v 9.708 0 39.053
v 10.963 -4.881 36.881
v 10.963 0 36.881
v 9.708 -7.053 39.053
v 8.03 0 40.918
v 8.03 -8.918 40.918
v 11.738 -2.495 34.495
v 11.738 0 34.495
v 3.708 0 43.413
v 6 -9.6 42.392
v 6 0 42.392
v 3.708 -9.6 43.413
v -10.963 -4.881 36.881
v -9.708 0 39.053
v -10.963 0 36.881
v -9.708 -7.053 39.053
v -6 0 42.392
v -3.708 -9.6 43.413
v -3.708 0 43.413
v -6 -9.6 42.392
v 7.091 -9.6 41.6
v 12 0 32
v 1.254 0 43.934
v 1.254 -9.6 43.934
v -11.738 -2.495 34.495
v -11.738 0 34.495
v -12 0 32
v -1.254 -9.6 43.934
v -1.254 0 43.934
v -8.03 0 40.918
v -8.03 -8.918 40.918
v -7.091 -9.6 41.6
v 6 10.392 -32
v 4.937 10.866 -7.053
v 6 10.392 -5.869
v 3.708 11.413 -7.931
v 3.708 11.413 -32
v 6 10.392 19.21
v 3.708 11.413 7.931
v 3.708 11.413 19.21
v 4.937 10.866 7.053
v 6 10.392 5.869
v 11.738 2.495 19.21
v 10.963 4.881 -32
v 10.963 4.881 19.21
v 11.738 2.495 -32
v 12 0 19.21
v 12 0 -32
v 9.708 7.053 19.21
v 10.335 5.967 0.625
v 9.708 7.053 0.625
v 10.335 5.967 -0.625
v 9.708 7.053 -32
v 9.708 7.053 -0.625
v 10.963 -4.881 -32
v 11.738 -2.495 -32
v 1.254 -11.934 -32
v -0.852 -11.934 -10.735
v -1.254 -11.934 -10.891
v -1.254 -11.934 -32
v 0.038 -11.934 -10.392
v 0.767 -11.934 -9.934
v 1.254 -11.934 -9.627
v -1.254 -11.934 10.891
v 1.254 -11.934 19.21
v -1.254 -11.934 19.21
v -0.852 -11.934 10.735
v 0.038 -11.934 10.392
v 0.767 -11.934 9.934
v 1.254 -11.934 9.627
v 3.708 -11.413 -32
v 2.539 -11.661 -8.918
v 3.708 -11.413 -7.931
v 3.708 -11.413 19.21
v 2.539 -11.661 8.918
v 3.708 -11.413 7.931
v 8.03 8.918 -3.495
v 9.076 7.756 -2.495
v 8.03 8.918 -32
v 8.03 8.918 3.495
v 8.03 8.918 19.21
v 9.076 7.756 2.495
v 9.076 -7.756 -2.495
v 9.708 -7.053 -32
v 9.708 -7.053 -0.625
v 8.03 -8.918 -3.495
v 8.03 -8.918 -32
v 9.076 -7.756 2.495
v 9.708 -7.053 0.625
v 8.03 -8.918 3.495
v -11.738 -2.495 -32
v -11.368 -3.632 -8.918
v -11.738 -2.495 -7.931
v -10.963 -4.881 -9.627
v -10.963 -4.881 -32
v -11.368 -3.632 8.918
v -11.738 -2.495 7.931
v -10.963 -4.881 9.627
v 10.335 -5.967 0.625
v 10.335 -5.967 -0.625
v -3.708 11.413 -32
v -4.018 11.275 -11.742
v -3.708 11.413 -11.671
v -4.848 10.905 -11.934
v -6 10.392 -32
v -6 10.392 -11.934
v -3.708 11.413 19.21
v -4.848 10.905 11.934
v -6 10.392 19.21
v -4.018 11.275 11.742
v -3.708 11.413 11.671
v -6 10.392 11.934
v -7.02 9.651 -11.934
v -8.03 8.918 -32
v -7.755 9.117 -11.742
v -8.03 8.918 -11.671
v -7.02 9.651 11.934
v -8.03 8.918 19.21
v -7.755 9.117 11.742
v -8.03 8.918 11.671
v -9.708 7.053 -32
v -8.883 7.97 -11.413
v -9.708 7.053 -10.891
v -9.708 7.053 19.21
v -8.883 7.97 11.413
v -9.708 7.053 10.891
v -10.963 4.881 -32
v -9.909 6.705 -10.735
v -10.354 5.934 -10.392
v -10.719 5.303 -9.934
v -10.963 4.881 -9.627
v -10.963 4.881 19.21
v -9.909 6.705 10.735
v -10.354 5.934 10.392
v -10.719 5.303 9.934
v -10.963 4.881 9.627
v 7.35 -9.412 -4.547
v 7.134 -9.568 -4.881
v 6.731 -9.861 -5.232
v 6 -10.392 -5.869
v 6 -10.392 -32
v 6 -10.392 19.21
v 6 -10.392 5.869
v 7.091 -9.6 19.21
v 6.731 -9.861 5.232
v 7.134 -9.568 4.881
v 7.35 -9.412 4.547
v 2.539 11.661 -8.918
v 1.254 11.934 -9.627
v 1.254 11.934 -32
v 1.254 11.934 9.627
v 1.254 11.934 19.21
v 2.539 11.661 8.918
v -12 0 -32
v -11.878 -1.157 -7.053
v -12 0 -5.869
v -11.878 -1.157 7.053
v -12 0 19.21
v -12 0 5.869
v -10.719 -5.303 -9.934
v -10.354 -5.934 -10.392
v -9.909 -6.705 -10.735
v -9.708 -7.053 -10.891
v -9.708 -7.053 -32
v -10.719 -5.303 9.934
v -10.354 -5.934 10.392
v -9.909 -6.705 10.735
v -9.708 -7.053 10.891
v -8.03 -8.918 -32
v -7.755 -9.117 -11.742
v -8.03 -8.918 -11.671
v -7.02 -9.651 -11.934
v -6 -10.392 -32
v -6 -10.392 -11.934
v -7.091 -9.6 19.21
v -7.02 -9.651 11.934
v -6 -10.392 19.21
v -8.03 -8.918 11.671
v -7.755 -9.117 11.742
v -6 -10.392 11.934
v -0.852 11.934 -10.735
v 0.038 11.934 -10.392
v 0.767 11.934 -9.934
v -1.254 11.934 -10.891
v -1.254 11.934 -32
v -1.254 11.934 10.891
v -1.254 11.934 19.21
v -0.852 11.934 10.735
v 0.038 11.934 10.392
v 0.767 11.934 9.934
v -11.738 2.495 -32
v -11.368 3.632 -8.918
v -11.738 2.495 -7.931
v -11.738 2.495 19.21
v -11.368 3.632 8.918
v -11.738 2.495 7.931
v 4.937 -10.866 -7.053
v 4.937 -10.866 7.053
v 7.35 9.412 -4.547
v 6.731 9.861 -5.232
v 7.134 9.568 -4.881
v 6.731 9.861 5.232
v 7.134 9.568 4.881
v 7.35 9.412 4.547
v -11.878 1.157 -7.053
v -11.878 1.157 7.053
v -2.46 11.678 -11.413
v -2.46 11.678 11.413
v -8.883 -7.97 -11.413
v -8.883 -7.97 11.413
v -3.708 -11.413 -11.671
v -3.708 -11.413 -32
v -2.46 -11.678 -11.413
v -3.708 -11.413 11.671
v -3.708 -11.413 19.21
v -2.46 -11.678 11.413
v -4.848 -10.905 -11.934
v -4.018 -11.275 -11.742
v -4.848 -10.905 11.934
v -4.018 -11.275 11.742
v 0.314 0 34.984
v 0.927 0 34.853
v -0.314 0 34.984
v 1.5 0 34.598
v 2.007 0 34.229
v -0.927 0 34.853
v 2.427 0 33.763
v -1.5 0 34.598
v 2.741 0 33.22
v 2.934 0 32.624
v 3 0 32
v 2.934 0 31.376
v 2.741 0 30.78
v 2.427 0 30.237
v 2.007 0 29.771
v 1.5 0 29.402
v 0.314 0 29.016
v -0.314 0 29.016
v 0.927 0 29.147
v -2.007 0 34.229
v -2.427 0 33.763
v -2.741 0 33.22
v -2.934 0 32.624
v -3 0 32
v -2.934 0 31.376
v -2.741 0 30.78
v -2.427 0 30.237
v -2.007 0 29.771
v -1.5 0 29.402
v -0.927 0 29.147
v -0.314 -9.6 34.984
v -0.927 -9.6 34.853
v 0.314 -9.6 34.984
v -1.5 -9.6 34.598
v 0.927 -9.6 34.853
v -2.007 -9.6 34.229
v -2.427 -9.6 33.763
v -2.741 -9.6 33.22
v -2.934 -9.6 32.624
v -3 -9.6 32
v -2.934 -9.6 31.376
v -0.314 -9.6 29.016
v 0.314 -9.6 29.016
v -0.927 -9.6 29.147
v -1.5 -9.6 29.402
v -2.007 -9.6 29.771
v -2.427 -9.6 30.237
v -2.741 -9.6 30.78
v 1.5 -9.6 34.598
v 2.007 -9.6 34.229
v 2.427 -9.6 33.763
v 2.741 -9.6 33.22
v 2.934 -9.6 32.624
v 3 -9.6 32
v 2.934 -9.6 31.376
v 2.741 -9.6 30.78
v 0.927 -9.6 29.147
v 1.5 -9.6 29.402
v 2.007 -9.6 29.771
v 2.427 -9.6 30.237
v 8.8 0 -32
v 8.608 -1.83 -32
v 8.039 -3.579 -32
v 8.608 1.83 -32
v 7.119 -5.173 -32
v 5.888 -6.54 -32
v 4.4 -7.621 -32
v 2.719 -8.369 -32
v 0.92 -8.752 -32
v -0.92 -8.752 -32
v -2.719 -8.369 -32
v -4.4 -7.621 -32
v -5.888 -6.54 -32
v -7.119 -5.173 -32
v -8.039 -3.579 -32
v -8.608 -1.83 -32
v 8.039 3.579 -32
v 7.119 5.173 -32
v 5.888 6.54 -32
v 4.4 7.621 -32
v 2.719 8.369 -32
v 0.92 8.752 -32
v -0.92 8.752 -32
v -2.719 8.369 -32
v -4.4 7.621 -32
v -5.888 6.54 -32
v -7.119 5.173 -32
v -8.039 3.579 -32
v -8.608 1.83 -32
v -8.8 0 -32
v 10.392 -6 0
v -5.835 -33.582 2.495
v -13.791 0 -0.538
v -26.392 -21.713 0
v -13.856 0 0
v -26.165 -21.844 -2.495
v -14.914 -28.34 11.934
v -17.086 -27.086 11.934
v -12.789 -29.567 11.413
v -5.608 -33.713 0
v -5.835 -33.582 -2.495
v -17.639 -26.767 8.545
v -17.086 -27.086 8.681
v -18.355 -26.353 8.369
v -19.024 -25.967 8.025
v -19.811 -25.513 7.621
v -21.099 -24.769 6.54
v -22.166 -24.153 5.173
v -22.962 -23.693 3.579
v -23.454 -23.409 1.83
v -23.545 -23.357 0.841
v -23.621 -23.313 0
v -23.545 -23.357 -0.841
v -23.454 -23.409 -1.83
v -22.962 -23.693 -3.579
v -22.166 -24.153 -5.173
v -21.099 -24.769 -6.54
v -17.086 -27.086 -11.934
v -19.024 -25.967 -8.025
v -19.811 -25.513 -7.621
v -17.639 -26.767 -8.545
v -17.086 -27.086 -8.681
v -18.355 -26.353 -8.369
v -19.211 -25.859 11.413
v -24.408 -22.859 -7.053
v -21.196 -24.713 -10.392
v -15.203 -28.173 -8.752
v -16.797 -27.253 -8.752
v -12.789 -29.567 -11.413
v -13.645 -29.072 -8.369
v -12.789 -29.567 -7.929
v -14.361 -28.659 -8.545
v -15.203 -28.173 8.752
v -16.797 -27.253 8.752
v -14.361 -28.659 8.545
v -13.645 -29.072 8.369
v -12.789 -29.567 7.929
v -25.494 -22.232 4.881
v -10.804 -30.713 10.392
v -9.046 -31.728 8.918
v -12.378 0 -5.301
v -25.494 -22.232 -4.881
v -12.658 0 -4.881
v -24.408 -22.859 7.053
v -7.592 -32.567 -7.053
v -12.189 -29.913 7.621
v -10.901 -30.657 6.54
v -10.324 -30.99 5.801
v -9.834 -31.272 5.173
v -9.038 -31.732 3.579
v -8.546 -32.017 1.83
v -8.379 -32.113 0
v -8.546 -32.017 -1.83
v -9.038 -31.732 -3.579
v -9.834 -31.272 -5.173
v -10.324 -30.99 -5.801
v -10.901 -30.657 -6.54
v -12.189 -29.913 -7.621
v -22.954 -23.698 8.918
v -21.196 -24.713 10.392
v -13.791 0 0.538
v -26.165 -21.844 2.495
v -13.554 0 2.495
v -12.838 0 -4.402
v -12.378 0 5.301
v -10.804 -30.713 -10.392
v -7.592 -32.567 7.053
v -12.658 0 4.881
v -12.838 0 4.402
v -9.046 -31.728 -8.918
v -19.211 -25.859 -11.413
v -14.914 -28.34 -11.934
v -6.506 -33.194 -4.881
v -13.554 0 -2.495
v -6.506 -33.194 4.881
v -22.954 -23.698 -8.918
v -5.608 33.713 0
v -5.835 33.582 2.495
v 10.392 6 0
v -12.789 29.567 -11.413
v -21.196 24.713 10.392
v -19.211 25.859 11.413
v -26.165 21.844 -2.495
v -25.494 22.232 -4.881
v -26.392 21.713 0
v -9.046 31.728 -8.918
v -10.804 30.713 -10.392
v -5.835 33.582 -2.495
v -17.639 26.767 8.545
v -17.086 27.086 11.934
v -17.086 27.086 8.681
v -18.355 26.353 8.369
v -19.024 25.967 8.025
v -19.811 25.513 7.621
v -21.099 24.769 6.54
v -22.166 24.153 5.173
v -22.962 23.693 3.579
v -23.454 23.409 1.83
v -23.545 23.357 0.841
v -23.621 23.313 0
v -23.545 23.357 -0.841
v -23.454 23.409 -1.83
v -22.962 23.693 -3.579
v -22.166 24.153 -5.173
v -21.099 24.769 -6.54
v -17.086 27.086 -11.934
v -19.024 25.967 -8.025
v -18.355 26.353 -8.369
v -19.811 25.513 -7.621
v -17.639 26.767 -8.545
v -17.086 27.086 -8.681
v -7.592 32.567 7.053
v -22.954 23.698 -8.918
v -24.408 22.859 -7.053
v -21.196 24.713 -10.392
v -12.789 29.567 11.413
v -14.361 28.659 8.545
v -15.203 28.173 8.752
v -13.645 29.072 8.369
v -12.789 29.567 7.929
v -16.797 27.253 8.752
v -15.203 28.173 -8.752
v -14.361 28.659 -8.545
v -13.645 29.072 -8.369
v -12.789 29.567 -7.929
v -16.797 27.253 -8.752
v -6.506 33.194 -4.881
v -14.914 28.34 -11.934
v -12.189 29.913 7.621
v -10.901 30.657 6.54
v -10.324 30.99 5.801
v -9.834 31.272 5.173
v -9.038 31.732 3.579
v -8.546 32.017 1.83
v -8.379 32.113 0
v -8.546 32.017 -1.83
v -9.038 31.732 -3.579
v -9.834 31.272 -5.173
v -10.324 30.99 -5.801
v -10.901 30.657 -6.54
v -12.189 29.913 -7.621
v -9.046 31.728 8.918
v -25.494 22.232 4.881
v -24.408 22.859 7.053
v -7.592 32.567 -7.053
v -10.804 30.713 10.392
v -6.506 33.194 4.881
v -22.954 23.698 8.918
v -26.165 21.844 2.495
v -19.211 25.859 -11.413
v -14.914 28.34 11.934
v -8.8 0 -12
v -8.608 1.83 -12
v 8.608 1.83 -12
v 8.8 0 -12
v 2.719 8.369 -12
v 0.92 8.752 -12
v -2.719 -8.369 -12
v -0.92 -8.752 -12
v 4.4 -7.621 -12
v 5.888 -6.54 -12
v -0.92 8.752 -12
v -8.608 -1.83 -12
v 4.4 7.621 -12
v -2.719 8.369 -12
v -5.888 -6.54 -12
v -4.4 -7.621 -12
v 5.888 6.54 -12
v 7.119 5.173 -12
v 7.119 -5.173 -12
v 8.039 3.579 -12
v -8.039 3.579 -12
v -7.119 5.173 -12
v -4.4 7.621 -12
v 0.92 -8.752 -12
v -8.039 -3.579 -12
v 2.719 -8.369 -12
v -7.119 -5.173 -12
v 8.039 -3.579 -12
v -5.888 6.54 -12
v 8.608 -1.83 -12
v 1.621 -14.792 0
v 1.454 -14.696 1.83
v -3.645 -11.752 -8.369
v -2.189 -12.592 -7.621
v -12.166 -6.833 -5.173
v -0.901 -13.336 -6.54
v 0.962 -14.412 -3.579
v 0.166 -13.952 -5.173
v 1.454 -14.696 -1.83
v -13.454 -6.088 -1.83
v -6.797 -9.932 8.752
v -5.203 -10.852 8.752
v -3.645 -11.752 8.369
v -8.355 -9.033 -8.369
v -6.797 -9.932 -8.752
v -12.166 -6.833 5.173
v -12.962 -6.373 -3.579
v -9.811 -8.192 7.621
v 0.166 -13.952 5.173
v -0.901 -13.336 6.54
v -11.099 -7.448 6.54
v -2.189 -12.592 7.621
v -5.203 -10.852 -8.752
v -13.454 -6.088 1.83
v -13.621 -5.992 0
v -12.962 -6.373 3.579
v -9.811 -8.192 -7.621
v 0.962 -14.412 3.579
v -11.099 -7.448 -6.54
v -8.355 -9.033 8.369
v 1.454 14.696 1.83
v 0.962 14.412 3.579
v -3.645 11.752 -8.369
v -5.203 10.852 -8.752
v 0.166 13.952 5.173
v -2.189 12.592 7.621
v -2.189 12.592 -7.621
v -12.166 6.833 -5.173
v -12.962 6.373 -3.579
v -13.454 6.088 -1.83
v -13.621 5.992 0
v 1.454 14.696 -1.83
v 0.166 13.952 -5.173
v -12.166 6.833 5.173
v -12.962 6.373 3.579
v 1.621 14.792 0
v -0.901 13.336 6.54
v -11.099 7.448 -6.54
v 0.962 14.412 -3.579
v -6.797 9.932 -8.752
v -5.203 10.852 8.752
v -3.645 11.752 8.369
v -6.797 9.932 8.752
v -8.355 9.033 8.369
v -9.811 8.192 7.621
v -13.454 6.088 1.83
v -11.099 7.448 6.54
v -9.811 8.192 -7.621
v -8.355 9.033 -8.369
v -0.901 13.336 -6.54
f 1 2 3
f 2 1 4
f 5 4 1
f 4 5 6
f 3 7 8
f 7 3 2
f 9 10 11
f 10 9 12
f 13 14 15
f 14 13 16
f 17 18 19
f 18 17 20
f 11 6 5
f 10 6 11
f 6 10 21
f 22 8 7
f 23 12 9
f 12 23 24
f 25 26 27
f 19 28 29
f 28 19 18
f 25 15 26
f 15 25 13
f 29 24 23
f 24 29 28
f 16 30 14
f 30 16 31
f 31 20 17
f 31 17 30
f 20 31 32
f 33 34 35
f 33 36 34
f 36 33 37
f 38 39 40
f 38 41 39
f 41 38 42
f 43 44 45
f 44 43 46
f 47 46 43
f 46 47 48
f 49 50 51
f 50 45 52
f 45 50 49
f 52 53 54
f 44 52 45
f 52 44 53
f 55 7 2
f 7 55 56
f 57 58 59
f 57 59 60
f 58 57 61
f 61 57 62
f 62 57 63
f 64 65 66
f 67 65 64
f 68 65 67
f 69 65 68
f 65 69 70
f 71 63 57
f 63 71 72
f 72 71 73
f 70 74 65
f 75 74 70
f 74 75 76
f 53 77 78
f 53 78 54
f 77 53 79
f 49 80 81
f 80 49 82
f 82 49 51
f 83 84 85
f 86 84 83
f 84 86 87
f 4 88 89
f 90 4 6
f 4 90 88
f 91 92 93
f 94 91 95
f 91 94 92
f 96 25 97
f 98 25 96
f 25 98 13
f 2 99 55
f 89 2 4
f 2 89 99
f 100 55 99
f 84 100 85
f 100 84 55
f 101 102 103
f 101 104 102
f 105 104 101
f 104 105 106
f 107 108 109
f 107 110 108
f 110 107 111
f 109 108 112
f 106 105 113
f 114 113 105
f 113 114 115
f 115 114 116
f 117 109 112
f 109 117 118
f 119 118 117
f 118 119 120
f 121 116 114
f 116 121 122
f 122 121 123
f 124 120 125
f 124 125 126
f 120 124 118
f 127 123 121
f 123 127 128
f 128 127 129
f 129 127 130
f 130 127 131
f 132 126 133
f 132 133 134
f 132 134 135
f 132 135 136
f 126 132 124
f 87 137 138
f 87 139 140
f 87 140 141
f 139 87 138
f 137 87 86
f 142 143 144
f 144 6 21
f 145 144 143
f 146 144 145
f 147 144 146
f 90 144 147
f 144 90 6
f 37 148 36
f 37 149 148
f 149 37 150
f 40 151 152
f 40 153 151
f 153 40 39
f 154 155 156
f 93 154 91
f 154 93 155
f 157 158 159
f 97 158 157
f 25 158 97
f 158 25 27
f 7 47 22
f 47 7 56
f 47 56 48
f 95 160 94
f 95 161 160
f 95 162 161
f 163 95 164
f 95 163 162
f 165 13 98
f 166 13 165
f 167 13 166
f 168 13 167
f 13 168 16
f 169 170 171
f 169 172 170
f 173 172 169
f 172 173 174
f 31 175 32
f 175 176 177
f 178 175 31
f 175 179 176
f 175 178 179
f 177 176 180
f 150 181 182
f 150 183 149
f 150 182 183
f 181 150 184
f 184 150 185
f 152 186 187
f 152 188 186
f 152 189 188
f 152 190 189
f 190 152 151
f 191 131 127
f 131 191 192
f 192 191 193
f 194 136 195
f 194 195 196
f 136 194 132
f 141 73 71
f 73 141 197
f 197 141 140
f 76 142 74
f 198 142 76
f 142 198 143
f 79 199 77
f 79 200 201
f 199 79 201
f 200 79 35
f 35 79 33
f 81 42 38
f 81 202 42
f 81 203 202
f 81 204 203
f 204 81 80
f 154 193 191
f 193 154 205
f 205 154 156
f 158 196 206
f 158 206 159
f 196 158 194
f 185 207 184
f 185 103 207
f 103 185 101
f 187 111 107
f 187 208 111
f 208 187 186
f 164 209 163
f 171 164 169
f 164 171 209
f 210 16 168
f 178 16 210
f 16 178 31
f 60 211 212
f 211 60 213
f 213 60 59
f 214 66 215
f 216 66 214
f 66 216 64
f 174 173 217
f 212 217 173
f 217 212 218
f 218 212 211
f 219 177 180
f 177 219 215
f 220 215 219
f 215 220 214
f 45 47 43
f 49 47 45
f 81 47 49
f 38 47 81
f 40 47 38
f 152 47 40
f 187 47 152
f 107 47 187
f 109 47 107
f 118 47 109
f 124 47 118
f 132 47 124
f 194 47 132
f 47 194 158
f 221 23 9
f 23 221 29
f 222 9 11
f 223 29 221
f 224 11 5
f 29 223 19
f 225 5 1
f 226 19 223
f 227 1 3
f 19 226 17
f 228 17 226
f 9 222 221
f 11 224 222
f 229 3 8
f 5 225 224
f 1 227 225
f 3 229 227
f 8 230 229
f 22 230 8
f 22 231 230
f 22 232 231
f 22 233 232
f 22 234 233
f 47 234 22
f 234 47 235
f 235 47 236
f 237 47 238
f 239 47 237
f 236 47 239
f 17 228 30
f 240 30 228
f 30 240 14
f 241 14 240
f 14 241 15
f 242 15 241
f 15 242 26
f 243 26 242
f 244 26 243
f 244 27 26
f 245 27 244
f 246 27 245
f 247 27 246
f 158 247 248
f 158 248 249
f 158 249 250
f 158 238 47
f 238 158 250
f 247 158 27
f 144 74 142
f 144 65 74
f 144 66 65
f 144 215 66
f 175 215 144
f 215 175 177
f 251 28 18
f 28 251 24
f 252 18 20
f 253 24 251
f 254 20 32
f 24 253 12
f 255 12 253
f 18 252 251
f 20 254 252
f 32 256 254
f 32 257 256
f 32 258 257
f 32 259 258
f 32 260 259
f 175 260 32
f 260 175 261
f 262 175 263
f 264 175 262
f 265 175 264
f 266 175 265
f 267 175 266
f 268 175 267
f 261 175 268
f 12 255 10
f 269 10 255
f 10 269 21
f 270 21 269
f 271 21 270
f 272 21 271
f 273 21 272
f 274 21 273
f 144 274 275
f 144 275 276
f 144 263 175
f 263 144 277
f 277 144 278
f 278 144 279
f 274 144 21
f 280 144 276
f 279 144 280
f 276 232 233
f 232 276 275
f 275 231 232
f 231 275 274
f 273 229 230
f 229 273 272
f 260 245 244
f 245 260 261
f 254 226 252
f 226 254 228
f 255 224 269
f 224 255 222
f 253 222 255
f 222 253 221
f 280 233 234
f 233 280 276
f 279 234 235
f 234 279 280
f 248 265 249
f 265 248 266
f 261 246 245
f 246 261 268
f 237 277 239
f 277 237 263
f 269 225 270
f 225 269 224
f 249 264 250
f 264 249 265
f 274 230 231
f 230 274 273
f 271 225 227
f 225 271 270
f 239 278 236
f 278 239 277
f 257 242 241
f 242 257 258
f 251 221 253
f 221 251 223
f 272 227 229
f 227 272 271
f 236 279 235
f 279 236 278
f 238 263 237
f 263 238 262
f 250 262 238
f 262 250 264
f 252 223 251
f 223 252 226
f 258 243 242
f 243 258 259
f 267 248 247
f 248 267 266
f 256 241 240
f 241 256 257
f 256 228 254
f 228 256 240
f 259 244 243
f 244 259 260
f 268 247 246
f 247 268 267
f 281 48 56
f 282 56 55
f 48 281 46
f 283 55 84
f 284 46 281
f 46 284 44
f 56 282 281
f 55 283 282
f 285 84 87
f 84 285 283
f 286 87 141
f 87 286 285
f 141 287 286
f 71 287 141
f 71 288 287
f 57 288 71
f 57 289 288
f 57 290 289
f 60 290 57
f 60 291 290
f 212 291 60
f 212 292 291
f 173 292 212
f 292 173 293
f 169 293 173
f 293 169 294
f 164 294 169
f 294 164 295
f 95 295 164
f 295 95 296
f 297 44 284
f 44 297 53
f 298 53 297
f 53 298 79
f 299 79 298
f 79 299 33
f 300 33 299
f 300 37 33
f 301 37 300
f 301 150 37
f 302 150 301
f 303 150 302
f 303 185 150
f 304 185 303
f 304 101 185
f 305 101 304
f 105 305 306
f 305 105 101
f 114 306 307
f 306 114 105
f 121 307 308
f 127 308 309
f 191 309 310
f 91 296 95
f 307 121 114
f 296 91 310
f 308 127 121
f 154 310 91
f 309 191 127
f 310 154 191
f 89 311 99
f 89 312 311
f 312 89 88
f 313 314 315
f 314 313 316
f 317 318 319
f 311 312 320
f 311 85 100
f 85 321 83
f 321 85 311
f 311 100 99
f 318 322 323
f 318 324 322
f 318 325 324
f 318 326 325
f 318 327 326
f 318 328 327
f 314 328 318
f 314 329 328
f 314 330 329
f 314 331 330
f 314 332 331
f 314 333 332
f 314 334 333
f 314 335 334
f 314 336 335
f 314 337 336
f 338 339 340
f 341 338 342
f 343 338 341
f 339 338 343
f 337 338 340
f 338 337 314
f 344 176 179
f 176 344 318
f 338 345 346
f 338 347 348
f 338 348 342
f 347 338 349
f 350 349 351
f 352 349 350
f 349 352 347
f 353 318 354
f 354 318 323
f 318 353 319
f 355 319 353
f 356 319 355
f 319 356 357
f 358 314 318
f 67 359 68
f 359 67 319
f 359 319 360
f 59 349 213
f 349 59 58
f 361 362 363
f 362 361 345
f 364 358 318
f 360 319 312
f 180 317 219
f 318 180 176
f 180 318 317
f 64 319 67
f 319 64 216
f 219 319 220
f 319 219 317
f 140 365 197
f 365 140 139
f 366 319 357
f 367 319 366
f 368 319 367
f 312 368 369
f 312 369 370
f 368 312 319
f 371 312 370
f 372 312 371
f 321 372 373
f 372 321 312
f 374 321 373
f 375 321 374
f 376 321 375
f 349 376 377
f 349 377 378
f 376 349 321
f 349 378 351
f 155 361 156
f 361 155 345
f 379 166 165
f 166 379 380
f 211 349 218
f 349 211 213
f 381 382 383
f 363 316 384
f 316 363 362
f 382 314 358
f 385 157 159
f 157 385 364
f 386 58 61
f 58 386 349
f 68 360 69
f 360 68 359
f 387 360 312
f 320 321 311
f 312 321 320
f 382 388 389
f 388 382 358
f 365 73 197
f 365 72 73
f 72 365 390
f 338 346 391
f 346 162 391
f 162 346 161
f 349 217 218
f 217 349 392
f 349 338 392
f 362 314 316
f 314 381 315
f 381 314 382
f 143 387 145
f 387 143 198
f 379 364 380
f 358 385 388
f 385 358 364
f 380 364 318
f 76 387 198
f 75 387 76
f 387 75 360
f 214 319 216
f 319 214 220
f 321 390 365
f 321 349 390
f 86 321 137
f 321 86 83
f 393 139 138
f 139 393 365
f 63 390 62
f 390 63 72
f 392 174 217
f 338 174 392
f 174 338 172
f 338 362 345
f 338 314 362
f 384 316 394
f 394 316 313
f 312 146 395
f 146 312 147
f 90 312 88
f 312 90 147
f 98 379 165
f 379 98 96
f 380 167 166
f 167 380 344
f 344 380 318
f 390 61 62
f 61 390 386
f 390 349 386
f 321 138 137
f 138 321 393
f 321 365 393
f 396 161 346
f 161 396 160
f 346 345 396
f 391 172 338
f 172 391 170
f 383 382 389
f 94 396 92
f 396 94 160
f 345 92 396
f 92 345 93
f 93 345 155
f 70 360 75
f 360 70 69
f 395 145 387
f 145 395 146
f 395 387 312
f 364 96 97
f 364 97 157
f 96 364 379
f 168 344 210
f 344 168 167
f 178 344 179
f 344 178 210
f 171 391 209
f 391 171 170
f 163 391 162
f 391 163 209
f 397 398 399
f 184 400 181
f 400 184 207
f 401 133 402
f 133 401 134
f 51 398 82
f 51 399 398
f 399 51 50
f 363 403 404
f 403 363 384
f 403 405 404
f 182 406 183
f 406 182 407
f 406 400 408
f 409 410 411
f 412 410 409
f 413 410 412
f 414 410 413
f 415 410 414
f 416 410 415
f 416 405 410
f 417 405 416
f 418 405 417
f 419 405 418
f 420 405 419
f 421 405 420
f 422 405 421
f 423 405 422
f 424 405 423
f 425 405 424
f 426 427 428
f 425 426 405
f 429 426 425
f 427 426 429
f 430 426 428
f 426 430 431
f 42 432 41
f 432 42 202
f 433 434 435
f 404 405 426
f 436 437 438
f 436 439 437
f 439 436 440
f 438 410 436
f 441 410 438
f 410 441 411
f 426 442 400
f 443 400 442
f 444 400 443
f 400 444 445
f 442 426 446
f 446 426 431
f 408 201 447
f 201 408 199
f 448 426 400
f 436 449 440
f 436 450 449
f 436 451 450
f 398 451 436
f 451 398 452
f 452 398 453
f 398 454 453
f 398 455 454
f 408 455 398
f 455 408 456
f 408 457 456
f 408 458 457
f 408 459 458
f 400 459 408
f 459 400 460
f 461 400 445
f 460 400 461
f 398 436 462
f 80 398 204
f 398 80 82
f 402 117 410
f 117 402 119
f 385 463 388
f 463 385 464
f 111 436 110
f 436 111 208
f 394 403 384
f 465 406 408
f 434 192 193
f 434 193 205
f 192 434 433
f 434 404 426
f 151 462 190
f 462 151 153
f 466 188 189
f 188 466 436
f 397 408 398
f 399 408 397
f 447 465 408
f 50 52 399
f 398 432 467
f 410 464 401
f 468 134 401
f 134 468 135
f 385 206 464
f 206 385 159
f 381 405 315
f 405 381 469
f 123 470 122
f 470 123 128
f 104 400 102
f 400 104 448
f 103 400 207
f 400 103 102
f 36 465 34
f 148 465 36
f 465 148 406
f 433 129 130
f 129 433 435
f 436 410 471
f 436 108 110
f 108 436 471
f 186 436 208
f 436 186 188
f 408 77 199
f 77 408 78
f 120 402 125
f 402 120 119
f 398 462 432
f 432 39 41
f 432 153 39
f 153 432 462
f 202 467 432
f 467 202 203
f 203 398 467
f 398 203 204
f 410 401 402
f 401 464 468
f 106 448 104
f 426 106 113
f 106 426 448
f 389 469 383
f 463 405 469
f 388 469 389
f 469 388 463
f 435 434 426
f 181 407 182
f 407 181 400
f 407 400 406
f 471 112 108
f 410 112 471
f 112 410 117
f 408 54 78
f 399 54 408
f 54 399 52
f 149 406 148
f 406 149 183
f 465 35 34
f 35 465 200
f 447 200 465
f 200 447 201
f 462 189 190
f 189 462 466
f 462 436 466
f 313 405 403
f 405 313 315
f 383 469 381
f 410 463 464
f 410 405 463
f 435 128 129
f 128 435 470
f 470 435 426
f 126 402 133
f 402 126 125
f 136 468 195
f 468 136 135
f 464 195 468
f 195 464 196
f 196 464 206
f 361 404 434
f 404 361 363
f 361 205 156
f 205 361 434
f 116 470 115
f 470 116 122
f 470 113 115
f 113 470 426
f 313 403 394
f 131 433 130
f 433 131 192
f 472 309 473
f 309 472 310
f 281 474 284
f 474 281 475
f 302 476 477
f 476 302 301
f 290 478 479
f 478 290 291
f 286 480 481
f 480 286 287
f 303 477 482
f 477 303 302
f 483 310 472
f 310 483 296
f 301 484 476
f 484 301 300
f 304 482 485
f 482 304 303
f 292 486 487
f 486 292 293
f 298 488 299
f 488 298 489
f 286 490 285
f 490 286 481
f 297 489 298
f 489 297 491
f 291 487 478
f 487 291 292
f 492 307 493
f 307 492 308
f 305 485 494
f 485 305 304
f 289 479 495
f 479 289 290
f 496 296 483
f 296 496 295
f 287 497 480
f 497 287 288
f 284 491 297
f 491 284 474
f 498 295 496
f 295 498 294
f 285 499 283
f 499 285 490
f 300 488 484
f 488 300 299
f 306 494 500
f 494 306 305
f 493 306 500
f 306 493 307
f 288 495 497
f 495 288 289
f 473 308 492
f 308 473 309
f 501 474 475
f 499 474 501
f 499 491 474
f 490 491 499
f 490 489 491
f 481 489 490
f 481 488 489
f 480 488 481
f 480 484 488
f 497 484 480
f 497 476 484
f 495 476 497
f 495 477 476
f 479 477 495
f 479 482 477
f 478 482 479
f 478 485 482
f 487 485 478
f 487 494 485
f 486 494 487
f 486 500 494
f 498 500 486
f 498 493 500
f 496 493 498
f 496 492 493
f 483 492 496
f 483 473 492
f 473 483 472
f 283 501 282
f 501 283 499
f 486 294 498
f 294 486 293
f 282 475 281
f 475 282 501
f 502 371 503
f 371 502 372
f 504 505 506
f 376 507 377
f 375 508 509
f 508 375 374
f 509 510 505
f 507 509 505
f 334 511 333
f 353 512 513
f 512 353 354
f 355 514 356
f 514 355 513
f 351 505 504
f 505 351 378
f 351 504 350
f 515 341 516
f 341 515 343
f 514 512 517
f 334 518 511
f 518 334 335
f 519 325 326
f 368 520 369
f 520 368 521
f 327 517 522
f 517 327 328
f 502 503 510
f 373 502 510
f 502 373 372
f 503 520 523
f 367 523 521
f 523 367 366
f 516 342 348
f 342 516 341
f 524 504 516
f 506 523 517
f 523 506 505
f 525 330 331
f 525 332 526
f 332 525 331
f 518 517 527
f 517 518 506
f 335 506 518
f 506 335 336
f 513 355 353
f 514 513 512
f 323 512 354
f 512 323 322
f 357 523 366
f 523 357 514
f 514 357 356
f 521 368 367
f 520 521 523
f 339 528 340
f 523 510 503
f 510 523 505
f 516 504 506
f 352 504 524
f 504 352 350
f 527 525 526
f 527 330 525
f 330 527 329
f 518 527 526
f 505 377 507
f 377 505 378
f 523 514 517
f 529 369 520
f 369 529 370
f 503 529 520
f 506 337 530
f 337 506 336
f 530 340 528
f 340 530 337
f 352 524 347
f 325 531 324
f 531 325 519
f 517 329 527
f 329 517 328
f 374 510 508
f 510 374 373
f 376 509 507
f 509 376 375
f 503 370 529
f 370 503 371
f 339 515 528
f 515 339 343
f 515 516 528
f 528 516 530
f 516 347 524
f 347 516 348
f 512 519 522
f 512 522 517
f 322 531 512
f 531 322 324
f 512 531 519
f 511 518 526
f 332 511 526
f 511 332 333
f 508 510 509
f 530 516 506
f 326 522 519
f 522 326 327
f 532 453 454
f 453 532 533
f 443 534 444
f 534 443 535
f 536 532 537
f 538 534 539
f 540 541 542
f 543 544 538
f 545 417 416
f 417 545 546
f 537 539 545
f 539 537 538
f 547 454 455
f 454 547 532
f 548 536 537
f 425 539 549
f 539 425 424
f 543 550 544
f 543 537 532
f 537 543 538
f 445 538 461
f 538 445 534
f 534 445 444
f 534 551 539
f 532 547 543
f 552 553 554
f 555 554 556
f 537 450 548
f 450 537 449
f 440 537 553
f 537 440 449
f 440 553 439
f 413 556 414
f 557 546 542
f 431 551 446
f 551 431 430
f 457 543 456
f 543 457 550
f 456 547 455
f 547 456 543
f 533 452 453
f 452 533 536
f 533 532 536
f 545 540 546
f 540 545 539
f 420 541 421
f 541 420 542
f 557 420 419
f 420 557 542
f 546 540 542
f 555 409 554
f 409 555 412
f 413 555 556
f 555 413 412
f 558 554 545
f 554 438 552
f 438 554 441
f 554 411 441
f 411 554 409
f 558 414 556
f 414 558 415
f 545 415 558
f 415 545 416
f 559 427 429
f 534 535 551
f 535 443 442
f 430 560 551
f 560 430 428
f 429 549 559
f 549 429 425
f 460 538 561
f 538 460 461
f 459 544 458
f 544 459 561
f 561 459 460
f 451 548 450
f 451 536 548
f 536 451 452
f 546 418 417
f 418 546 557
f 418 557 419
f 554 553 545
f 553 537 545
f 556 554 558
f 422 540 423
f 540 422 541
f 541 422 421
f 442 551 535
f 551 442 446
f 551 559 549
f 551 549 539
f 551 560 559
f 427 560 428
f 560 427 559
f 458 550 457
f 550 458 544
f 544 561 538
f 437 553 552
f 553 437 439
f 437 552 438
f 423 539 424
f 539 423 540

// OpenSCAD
// Use the OpenScad customizer

  //////////////////////////////////
 // Basket Corner Support - V1.0 //
//////////////////////////////////




/* [Facets] */
$fn=30;              // [10:60]

/* [Extrude] */
// Extrusion Correction
$EC = 0.4;          // [0:.1:1]



/* [Body] */

// if enabled outer cross section given by $fn) 
ExtRound    = true;

// Adjustable top connector (compatible with Adjustable Elbow)
FlexTop     = true;

// Bottom connector
Bottom      = true;

// Number of sides to interior hole
TubeCorners = 30;    // [3:60]

// Angle of interior hole
Phase       = 0;     // [0:90]

// Thickness of wall if ExtRound = false
WallThick   =  4;    // [2:1:20]

// Interior Radius (from center to tip)
IntRad      =  8;    // [1:.01:50]

// Depth of hole from end inward
Depth       = 20.0;  // [2:1:70]

InsideAngle = 120;   // [20:180]



/* [Pin] */
PinEna = false;

// Radius of pin
PinRad = 3;         // [2:.01:10]

// Placement of pin along shaft

PinPos = .785;       // [0:.01:1]

// * Pin angle
PinPhase  = 45;        // [0:90]


fn = (ExtRound)? $fn: TubeCorners;

OuterRad  = IntRad + WallThick;
InnerRad  = IntRad + $EC;

SegH  = Depth+OuterRad; 
IA2 = 90-InsideAngle/2;


difference() {
   union() {
      if (!FlexTop) {
         Cyl();
      } else {
         Support();
      }
      if (Bottom) {
         mirror([0,0,1]) Cyl();
      } else {
         translate([0,0,-OuterRad])  
         Cyl1();
      }
      
      rotate([90,0,-IA2]) Cyl(); 
      rotate([-90,0,IA2]) mirror([0,1,0]) Cyl();

   }
   if (!FlexTop) Hole();
   if (Bottom) mirror([0,0,1]) Hole();
   rotate([90,0,-IA2]) Hole();
   rotate([-90,0,IA2]) mirror([0,1,0]) Hole();
}


module Support() {
   Cyl1();
   translate([0,0,OuterRad*2+Depth]) 
   mirror([0,0,1])
   difference() {
      Cyl();
      
      // clip bottom 
      translate([-OuterRad-1,0,-.01])
      cube(2*[(OuterRad+1),OuterRad,OuterRad+$EC]);

      translate([-OuterRad-1,-OuterRad*2.8,-.01])
      cube(2*[(OuterRad+1),OuterRad,OuterRad+$EC]);
      
      // Pinholw
      translate([0,0,OuterRad])
      rotate([90,0,0])
      cylinder(r=PinRad,h=OuterRad*4,center=true,$fn=30);
      
      // Round Bottom
      difference() {
         cube([2*OuterRad+1,4*OuterRad,2*OuterRad],center=true); 
     
         translate([0,0,OuterRad])
         rotate([90,0,0])
         cylinder(r=OuterRad,h=OuterRad*3,center=true);
         
      }
   }
}


module Cyl1(H=OuterRad){
   
   rotate([0,0,Phase]) 
      cylinder(h=H,r=OuterRad,$fn=fn); 
      
}

module Cyl(){
      
   rotate([0,0,Phase]) 
      cylinder(SegH,r=OuterRad,$fn=fn); 
      
}


module Hole(){
   rotate([0,0,Phase]) {
      translate([0,0,OuterRad]) 
      cylinder(SegH+5,r=InnerRad+$EC,$fn=TubeCorners); 
         
      if (PinEna) 
         translate([0,0,OuterRad+PinRad+$EC+PinPos*(Depth-(PinRad+$EC)*2)]) 
         rotate([45,90,Phase]) 
         cylinder(r=PinRad+$EC,h=OuterRad*4,center=true,$fn=30);
   }
}
